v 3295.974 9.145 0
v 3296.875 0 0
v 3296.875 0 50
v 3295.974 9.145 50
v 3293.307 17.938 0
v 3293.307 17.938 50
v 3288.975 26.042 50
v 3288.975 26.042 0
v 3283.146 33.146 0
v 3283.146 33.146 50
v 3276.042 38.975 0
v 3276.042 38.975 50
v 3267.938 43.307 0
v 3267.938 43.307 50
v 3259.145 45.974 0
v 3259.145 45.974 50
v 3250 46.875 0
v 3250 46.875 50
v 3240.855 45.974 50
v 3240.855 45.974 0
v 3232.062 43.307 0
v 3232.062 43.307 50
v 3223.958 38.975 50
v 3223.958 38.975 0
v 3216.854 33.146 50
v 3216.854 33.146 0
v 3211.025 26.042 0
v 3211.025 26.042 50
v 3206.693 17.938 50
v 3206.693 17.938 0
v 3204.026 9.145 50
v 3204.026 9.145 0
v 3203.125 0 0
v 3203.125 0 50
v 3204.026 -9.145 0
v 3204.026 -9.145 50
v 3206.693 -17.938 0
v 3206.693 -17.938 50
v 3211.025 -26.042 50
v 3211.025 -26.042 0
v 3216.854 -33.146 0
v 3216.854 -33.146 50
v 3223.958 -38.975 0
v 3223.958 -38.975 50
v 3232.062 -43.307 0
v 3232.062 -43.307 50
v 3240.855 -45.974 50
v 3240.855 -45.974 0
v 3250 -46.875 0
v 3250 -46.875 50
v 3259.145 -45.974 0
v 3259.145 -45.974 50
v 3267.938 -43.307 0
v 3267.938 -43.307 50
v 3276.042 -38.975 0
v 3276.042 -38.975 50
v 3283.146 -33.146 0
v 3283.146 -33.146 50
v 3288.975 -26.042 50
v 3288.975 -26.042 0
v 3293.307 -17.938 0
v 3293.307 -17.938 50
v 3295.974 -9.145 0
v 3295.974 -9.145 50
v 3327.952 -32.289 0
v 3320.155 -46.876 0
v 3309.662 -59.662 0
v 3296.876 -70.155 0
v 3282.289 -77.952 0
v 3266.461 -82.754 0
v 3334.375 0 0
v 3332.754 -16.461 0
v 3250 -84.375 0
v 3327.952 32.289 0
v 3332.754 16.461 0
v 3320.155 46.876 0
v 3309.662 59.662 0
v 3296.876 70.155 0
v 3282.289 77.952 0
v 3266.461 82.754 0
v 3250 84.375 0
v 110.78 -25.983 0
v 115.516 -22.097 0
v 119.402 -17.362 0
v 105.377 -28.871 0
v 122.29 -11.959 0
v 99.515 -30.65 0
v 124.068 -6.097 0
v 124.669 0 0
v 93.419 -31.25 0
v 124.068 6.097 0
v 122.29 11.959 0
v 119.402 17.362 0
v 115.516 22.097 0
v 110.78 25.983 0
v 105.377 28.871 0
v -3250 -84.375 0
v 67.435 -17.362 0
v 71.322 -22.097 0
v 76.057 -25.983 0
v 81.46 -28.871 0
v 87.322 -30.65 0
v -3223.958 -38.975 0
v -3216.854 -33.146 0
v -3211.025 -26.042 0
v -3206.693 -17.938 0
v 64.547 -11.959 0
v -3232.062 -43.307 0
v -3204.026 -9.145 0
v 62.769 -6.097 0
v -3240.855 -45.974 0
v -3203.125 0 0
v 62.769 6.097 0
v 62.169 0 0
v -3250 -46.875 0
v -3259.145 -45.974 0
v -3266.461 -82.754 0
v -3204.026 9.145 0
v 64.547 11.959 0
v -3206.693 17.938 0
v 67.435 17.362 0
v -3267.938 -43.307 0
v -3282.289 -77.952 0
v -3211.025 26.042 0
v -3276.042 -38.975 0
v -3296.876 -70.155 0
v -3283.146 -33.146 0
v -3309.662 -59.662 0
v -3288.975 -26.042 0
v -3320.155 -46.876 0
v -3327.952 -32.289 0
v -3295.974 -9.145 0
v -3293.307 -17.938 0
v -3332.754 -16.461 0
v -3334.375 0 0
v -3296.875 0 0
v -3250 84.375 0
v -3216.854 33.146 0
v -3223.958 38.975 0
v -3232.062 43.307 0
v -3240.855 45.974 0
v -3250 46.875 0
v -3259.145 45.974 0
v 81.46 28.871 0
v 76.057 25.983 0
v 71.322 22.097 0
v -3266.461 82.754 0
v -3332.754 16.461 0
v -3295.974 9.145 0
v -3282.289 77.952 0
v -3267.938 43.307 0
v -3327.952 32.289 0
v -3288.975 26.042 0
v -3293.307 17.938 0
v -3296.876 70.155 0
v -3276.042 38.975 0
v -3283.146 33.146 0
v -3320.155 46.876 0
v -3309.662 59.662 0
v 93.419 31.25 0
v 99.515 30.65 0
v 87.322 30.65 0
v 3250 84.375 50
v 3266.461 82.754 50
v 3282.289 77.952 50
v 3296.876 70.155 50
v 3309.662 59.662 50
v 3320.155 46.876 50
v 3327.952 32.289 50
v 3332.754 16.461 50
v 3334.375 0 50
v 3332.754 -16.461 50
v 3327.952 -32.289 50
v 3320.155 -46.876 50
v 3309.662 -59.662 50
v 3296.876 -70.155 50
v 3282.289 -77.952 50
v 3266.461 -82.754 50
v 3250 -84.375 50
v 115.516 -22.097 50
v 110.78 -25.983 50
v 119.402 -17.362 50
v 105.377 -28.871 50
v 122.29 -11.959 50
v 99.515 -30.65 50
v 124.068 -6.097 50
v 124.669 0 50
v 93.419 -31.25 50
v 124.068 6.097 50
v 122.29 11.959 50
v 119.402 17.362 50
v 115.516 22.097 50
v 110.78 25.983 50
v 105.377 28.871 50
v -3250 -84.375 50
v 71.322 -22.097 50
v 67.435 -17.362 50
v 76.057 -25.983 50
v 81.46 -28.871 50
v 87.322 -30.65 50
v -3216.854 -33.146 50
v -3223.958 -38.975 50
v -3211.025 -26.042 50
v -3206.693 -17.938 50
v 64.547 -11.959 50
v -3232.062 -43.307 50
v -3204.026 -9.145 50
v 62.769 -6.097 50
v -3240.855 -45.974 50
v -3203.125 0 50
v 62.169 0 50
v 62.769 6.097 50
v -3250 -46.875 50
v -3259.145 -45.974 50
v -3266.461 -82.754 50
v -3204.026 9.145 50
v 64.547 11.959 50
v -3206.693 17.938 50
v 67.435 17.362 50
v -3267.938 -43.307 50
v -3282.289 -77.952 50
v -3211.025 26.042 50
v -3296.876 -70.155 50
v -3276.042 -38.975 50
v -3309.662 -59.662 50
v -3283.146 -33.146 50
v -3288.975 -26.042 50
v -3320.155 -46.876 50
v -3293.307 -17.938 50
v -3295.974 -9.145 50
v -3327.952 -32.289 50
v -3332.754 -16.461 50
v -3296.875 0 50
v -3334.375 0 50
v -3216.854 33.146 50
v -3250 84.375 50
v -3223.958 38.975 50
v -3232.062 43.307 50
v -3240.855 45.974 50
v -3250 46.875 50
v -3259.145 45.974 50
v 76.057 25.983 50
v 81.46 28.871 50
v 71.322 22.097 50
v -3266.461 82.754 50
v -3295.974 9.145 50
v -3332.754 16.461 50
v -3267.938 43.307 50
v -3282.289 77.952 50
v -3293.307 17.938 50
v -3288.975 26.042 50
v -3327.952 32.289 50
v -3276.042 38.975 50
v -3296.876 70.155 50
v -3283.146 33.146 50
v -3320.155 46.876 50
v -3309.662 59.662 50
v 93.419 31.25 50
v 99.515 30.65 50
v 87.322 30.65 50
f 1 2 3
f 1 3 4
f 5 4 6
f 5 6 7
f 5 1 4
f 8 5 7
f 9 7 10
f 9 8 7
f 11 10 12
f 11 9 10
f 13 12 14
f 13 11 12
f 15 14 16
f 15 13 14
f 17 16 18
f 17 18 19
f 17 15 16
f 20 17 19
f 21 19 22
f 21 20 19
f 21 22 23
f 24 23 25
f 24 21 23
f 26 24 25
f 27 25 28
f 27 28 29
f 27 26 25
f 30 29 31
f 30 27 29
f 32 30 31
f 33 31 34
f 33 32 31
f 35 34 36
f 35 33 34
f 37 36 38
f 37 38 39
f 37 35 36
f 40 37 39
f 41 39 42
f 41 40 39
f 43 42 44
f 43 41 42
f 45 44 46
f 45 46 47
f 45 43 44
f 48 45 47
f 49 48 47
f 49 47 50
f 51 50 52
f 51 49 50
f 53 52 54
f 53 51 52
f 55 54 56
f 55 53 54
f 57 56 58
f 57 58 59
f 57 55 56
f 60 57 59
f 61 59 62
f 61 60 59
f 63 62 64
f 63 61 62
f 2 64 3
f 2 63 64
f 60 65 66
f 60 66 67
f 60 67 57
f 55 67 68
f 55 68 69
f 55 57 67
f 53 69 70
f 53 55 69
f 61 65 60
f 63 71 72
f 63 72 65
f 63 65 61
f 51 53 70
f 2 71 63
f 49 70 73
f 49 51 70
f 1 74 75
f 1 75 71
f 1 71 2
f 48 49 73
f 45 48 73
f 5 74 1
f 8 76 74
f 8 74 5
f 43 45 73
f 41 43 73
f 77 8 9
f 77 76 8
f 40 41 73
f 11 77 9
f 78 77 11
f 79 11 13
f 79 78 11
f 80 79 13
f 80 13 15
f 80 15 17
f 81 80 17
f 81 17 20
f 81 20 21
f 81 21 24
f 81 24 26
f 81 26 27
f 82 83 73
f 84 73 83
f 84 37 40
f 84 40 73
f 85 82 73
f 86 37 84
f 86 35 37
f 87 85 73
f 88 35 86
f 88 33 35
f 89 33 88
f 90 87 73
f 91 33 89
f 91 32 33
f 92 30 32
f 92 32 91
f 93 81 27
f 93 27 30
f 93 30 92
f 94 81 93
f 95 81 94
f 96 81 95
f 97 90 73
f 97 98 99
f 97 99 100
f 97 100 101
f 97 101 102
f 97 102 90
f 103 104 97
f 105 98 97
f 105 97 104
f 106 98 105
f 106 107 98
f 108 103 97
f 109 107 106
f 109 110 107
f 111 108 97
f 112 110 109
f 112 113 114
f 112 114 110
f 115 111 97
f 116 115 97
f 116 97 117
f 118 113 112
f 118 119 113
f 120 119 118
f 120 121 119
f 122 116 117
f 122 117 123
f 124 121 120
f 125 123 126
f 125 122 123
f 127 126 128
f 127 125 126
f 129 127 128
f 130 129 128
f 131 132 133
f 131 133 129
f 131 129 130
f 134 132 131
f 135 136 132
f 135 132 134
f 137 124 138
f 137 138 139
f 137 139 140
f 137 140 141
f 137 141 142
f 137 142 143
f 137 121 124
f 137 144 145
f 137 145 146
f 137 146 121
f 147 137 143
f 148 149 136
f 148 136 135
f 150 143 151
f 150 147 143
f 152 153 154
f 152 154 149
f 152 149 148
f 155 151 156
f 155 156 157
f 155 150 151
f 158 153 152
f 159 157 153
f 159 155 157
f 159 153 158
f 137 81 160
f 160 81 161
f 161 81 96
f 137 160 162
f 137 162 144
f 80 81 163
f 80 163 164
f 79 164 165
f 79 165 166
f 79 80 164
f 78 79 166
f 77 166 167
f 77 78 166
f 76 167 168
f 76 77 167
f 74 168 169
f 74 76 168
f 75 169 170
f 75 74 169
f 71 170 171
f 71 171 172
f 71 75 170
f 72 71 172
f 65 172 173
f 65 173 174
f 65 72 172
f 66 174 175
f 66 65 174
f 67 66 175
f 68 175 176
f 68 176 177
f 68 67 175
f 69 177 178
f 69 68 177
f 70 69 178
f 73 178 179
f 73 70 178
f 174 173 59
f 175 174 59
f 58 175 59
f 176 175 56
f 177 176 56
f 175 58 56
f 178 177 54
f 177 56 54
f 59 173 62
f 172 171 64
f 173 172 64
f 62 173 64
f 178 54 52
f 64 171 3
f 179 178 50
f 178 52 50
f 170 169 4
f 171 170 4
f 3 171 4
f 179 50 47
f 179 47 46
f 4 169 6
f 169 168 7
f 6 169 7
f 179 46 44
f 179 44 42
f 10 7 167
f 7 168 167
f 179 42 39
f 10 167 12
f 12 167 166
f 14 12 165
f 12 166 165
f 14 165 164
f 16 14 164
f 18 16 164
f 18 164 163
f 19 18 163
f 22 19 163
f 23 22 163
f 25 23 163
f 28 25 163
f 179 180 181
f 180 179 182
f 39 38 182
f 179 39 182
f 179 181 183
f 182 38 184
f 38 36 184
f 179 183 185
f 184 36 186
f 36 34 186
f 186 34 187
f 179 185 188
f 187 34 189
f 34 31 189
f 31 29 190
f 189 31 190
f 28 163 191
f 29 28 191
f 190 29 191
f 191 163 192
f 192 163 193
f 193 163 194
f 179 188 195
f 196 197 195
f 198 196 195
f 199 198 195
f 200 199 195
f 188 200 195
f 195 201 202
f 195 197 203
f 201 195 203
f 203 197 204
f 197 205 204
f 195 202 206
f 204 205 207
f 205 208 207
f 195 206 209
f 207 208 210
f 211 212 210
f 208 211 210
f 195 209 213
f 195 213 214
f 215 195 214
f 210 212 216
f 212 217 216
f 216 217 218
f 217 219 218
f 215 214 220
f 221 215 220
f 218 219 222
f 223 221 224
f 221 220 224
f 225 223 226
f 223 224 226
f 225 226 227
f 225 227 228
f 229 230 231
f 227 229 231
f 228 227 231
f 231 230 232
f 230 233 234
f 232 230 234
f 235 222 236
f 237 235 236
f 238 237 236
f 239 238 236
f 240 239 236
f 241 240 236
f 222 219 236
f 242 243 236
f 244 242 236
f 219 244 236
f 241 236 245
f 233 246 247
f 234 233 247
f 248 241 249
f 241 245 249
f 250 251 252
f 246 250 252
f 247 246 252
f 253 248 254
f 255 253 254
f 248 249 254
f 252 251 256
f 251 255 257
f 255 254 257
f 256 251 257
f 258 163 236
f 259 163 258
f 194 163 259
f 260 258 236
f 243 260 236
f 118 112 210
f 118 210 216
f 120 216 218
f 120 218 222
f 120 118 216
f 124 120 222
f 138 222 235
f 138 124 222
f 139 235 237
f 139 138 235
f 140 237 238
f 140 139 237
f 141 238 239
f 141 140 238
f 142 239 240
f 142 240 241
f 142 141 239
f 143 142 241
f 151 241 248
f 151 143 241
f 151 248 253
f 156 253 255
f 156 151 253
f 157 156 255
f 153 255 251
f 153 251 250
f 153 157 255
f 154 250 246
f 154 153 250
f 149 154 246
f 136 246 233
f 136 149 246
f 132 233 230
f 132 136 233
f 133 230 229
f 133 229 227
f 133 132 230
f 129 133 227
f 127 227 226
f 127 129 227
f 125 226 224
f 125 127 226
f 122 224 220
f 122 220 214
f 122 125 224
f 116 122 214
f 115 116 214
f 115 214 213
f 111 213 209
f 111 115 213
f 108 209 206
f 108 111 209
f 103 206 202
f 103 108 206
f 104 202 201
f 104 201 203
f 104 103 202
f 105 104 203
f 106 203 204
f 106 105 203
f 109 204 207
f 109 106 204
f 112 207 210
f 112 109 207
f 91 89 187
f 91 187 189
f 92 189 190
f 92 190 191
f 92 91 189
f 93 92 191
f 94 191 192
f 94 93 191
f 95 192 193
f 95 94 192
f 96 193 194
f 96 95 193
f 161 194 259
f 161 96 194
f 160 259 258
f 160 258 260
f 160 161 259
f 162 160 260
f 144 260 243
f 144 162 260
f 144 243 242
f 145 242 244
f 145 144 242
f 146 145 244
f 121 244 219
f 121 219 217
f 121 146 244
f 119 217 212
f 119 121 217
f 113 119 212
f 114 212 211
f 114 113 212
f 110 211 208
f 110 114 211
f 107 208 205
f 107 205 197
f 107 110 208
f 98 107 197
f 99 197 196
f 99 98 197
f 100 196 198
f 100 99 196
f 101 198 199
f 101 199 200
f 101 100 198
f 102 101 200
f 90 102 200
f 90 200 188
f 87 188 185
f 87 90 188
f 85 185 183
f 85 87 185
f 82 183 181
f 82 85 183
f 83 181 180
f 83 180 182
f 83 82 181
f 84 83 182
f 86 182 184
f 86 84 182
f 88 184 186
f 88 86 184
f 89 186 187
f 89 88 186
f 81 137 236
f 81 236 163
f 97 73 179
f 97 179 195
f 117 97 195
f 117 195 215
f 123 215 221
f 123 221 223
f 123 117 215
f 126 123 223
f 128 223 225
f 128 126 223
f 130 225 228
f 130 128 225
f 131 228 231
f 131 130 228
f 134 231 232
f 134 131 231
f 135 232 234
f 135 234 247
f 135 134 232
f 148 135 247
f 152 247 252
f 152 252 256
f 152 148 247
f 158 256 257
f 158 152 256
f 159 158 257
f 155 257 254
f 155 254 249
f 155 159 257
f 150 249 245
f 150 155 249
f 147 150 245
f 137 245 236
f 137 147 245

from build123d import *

# Parameters (mm, degrees)
SKETCH1_R           = 46.875
SKETCH1_R_2         = 31.25
BOSS_EXTRUDE1_DEPTH = 50


with BuildPart() as part:
    # Sketch1 → Boss-Extrude1 (new body)
    with BuildSketch(Plane.XY):
        with BuildLine():
            Line((-3250, 84.375), (3250, 84.375))
            ThreePointArc((3250, 84.375), (3334.375, 0), (3250, -84.375))
            Line((3250, -84.375), (-3250, -84.375))
            ThreePointArc((-3250, -84.375), (-3334.375, 0), (-3250, 84.375))
        make_face()
        with Locations((-3250, 0)):
            Circle(SKETCH1_R, mode=Mode.SUBTRACT)
        with Locations((93.418627244, 0)):
            Circle(SKETCH1_R_2, mode=Mode.SUBTRACT)
        with Locations((3250, 0)):
            Circle(SKETCH1_R, mode=Mode.SUBTRACT)
    extrude(amount=BOSS_EXTRUDE1_DEPTH)


solid = part.part
